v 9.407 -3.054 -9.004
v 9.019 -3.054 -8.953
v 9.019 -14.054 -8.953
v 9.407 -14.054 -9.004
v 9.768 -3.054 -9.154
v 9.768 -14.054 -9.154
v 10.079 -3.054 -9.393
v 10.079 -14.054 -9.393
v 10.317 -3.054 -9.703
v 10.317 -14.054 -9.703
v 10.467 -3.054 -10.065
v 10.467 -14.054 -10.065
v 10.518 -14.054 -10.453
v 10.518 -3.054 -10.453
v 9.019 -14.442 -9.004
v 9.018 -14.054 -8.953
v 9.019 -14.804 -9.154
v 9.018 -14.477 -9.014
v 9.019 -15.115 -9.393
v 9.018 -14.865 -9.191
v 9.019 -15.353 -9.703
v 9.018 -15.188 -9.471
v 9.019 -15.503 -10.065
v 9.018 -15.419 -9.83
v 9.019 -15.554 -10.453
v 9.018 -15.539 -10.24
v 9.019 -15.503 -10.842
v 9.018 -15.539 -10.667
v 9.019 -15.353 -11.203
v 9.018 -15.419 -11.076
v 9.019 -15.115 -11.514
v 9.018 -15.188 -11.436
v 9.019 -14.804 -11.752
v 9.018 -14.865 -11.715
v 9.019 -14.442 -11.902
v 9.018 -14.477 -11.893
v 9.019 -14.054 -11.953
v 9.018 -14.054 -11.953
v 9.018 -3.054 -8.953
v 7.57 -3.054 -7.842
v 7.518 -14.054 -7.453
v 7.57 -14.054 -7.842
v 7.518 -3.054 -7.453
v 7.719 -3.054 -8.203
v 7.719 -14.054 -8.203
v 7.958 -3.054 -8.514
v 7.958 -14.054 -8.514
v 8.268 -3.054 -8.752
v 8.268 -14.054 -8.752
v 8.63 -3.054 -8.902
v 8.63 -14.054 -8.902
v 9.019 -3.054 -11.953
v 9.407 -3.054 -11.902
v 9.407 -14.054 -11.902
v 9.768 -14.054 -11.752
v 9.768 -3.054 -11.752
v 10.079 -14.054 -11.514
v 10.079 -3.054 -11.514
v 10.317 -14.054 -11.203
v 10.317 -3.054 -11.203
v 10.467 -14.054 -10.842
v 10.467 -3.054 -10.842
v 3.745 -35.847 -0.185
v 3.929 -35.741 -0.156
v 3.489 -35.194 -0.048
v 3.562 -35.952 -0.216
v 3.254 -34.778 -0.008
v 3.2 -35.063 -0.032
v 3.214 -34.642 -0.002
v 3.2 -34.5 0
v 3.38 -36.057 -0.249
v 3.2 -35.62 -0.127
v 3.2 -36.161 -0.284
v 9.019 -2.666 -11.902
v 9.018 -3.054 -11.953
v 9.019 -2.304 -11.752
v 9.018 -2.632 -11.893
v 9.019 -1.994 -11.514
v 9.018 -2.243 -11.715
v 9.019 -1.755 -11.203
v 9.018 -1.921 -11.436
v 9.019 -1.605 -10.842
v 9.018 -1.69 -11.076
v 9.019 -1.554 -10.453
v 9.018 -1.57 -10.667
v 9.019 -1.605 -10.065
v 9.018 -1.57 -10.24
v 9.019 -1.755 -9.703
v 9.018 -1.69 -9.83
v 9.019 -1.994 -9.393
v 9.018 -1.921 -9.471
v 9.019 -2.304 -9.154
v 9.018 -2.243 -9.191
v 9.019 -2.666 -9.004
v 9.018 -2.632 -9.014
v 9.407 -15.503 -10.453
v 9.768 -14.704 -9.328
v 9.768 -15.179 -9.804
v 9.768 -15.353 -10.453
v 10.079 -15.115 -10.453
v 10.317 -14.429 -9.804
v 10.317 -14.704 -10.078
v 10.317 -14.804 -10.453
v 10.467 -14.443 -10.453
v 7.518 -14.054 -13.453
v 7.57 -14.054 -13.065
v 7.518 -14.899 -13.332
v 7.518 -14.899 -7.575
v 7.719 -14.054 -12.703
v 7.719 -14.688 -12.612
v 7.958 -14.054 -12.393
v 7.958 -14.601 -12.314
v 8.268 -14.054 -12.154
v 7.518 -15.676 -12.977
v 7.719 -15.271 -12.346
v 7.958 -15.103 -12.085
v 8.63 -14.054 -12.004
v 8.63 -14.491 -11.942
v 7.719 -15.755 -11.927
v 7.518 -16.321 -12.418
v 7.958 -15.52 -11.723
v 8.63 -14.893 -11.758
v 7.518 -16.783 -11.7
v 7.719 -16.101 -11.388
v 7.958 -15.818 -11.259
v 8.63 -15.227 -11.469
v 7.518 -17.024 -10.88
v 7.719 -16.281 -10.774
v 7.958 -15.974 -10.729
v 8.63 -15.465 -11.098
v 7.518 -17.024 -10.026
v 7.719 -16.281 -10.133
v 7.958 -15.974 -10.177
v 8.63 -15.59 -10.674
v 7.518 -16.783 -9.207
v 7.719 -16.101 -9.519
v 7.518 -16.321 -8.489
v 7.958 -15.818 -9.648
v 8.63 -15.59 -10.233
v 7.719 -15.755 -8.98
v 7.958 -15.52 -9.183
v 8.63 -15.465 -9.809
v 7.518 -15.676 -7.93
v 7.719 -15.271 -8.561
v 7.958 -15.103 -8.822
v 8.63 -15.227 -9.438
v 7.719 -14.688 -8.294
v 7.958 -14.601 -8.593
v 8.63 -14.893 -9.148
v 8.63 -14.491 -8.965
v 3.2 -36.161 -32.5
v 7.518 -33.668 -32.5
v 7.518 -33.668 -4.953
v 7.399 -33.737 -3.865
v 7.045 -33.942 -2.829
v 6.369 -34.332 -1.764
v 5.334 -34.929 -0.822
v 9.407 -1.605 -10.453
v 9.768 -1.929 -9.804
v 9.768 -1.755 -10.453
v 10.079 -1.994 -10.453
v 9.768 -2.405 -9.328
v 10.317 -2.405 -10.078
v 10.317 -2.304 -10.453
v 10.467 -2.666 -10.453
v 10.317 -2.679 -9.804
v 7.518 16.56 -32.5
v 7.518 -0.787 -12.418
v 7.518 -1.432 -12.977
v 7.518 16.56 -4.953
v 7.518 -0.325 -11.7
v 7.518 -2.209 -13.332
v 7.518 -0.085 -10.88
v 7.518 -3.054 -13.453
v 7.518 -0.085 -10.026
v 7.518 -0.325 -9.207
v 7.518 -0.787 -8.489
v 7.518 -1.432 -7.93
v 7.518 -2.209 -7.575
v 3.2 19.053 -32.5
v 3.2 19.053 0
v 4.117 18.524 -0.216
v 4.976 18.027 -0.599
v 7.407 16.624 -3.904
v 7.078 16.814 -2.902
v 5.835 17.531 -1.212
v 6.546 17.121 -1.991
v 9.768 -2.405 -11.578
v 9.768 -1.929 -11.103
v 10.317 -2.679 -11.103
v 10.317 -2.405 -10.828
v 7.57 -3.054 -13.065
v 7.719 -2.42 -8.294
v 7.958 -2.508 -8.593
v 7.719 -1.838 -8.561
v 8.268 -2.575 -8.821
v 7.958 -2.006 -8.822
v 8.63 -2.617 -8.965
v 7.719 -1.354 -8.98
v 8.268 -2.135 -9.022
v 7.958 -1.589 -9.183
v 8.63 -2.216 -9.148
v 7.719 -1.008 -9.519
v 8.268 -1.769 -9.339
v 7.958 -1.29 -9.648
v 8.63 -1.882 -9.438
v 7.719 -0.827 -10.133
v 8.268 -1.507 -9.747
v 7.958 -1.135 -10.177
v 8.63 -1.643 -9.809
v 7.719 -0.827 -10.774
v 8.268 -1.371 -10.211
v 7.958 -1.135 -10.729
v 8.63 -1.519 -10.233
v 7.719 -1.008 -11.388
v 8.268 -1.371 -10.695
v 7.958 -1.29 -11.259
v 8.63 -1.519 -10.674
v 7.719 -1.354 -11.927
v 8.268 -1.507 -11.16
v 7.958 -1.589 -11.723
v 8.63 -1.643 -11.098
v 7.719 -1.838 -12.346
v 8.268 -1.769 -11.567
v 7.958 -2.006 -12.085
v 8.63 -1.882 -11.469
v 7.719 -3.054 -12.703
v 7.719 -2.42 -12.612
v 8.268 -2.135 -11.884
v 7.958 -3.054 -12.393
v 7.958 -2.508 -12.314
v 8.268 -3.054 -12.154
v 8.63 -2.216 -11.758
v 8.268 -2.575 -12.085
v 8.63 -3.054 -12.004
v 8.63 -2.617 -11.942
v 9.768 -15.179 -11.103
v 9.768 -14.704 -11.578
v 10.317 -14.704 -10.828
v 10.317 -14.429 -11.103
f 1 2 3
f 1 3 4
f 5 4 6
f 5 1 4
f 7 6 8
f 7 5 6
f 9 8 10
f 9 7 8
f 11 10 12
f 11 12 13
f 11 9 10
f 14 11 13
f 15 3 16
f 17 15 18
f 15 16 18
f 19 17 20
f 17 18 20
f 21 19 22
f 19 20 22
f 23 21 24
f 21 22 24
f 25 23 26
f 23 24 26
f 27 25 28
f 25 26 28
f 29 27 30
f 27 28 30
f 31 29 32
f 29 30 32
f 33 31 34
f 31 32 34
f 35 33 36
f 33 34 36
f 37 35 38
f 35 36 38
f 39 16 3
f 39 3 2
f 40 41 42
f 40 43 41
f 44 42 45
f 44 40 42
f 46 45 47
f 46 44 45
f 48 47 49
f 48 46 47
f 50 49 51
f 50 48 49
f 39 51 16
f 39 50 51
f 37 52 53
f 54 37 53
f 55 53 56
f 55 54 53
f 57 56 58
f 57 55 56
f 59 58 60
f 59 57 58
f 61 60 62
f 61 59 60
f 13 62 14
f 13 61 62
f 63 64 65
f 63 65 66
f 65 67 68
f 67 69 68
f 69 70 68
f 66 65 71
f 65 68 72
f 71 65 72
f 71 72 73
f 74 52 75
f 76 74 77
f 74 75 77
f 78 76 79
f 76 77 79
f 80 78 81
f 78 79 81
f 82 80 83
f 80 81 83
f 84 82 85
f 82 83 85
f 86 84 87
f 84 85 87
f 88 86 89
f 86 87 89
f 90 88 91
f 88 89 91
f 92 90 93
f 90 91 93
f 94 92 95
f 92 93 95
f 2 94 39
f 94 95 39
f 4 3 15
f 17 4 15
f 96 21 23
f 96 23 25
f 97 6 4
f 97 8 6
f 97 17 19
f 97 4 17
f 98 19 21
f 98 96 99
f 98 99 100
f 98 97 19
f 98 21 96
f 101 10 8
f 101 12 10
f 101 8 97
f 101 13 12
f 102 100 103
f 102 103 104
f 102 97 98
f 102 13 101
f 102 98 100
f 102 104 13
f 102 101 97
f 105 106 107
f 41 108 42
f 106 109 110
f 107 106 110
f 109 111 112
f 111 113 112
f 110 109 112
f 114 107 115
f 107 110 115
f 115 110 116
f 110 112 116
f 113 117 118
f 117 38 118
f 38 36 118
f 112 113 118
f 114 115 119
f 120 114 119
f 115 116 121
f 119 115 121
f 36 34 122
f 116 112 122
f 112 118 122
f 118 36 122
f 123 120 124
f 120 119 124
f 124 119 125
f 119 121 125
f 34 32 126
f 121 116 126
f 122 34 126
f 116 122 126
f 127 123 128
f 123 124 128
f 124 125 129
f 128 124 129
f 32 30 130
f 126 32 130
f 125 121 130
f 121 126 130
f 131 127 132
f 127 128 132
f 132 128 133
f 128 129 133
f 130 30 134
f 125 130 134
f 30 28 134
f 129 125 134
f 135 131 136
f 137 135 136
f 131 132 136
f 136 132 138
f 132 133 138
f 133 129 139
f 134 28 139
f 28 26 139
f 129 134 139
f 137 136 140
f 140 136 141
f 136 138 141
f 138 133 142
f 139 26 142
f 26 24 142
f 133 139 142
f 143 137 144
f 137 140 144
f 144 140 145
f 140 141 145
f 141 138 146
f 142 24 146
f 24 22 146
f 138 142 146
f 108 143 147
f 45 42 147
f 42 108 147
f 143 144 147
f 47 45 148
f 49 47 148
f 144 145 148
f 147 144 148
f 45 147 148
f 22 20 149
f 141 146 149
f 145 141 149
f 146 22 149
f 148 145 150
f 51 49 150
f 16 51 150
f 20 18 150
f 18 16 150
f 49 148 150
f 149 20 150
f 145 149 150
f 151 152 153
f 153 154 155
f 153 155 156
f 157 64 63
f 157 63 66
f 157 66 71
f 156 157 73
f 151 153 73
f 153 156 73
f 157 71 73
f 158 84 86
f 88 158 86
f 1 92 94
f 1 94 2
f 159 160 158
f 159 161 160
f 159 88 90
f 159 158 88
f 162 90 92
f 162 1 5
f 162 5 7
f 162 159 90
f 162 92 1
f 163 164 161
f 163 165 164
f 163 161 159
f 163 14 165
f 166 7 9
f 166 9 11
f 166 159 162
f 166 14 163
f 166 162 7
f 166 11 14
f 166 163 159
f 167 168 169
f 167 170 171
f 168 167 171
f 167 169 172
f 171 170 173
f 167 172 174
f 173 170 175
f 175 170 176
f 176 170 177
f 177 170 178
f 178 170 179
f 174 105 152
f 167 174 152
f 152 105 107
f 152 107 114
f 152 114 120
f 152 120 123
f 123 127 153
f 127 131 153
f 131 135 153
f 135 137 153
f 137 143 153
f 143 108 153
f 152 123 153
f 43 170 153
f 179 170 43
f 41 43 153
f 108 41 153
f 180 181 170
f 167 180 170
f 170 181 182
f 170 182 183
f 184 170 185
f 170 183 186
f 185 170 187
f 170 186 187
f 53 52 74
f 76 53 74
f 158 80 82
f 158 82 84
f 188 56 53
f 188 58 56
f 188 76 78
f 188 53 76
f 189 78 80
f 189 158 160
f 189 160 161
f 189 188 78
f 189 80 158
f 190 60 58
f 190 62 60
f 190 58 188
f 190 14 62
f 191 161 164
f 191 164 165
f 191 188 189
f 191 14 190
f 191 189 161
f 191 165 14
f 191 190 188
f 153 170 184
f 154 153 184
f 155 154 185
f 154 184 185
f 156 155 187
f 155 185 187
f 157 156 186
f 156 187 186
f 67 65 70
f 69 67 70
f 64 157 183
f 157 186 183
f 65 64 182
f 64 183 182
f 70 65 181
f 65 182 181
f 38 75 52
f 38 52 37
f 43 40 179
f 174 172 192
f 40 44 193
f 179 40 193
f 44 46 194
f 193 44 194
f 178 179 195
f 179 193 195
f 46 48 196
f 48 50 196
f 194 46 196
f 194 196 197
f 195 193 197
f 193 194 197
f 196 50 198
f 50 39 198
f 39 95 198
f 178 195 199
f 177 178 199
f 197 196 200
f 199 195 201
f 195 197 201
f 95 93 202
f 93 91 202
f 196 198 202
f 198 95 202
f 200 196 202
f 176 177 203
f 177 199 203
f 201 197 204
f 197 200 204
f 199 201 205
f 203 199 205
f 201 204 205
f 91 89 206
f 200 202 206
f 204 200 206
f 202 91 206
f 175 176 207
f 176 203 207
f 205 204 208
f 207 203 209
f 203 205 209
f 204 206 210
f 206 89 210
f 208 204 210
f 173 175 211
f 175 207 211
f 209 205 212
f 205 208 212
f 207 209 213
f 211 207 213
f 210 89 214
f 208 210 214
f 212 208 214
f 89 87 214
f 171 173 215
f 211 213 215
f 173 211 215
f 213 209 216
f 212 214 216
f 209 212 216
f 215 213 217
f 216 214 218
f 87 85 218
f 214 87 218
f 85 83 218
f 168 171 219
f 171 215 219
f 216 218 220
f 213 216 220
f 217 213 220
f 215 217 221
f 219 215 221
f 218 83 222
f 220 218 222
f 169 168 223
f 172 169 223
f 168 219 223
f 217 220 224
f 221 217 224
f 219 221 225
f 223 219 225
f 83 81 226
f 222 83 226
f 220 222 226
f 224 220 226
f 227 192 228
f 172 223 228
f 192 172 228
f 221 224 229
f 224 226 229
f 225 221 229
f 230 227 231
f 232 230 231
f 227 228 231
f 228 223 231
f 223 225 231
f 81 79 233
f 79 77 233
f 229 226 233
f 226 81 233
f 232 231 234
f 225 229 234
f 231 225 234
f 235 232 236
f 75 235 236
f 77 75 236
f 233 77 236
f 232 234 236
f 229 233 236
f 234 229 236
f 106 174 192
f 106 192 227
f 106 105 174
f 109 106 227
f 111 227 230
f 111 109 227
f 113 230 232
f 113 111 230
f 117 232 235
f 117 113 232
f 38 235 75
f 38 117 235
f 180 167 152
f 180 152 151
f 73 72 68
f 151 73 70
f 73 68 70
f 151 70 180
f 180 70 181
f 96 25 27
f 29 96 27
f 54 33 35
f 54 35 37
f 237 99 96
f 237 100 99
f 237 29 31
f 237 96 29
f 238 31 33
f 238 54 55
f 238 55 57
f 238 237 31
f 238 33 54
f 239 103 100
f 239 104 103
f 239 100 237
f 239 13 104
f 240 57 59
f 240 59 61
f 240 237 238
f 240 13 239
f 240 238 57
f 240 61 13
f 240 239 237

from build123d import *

# Parameters (mm, degrees)
BOSS_EXTRUDE1_DEPTH = 32.5
FILLET1_R           = 5
BOSS_EXTRUDE2_DEPTH = 3
FILLET2_R           = 1.5
FILLET3_R           = 1.5
CUT_EXTRUDE1_REACH  = 51.168


# Some blends are built 0.0001 mm under size
with BuildPart() as part:
    # Sketch1 → Boss-Extrude1 (new body)
    with BuildSketch(Plane.XY):
        Polygon((7.518400000000005, 16.559701585568554), (7.518400000000011, -33.66819896343934), (3.199999999999987, -36.16142836590783), (3.1999999999999793, 19.05293098803705), align=None)
    extrude(amount=-BOSS_EXTRUDE1_DEPTH)

    # Fillet1
    # the kernel refuses this fillet: 5 mm, written as the material it takes off along each edge
    with BuildSketch(Plane(origin=(7.518400000000003, 28.94301228989969, 0), x_dir=(0, 0, -1), z_dir=(1.2e-16, -1, 0))) as fillet1_piece_1:
        with BuildLine():
            CenterArc((4.953324281732454, -5), FILLET1_R, 90, 82.16504398350045)
            Line((2.931e-14, -4.318400000000029), (-0.09906648563461919, -4.3047680000000295))
            ThreePointArc((-0.09906648563461919, -4.3047680000000295), (-0.1, -2.1592000000000144), (-0.1, 0))
            Line((-0.1, 0), (0, 0.09999999999999964))
            Line((0, 0.09999999999999964), (4.953324281732454, 0.09999999999999964))
            Line((4.953324281732454, 0.09999999999999964), (4.953324281732454, 0))
        make_face()
    extrude(amount=74.99452195767016, mode=Mode.SUBTRACT)

    # Sketch3 → Boss-Extrude2 (add)
    with BuildSketch(Plane(origin=(7.518400000000007, 9.1e-16, 0), x_dir=(0, 0, -1), z_dir=(1, 1.2e-16, 0))):
        Polygon((8.953324281732419, -1.5542486889353926), (11.953324281732419, -1.554248688935389), (11.95332428173242, -15.55424868893539), (8.95332428173242, -15.55424868893539), align=None)
    extrude(amount=BOSS_EXTRUDE2_DEPTH)

    # Fillet2
    fillet2_edges = [part.edges().sort_by_distance(p)[0] for p in [
        (10.518400000000009, -8.55424868893539, -8.95332428173242),
        (10.518400000000009, -15.554248688935388, -10.45332428173242),
        (10.518400000000009, -8.554248688935386, -11.95332428173242),
        (10.518400000000007, -1.5542486889353895, -10.453324281732419),
    ]]
    fillet(fillet2_edges, radius=FILLET2_R - 0.0001)  # a hair under: the kernel refuses the full size

    # Fillet3
    # the kernel refuses this fillet: 1.5 mm, written as the material it takes off along each edge
    with BuildSketch(Plane(origin=(10.518400000000009, -14.05424868893539, -10.45332428173242), x_dir=(1.2e-16, -1, 0), z_dir=(0, 0, 1))) as fillet3_piece_1:
        with BuildLine():
            CenterArc((9.999999999999e-05, -1.4999), 1.4999, 0, 90)
            Line((1.5, -1.4999), (1.5, 0))
            Line((1.5, 0), (9.999999999999e-05, 0))
        make_face()
    revolve(axis=Axis((10.518400000000009, -14.05424868893539, -10.45332428173242), (1, 1.2e-16, 0)), revolution_arc=90.00000000000001, mode=Mode.SUBTRACT)
    with BuildSketch(Plane(origin=(10.518400000000009, -14.054248688935388, -10.45332428173242), x_dir=(0, -1.3e-16, 1), z_dir=(-1.2e-16, 1, 1.3e-16))) as fillet3_piece_2:
        with BuildLine():
            CenterArc((9.999999999999e-05, -1.4999), 1.4999, 0, 90)
            Line((1.5, -1.4999), (1.5, 0))
            Line((1.5, 0), (9.999999999999e-05, 0))
        make_face()
    revolve(axis=Axis((10.518400000000009, -14.054248688935388, -10.45332428173242), (1, 1.2e-16, 0)), revolution_arc=90, mode=Mode.SUBTRACT)
    with BuildSketch(Plane(origin=(10.518400000000009, -3.05424868893539, -10.453324281732419), x_dir=(0, 1.3e-16, -1), z_dir=(1.2e-16, -1, -1.3e-16))) as fillet3_piece_3:
        with BuildLine():
            CenterArc((9.999999999999e-05, -1.4999), 1.4999, 0, 90)
            Line((1.5, -1.4999), (1.5, 0))
            Line((1.5, 0), (9.999999999999e-05, 0))
        make_face()
    revolve(axis=Axis((10.518400000000009, -3.05424868893539, -10.453324281732419), (1, 1.2e-16, 0)), revolution_arc=90.00000000000006, mode=Mode.SUBTRACT)
    with BuildSketch(Plane(origin=(10.518400000000009, -3.05424868893539, -10.453324281732419), x_dir=(-1.2e-16, 1, 1.18e-15), z_dir=(0, 1.18e-15, -1))) as fillet3_piece_4:
        with BuildLine():
            CenterArc((9.999999999999e-05, -1.4999), 1.4999, 0, 90)
            Line((1.5, -1.4999), (1.5, 0))
            Line((1.5, 0), (9.999999999999e-05, 0))
        make_face()
    revolve(axis=Axis((10.518400000000009, -3.05424868893539, -10.453324281732419), (1, 1.2e-16, 0)), revolution_arc=89.99999999999994, mode=Mode.SUBTRACT)
    with BuildSketch(Plane(origin=(7.518400000000007, -1.5542486889353917, -8.953324281732419), x_dir=(0, 1.18e-15, -1), z_dir=(1, 1.2e-16, 0))) as fillet3_piece_5:
        with BuildLine():
            CenterArc((FILLET3_R, -FILLET3_R), FILLET3_R, 90, 89.99999999999986)
            Line((-1.78e-15, -FILLET3_R), (-FILLET3_R * 0.02, -FILLET3_R))
            Line((-FILLET3_R * 0.02, -FILLET3_R), (-FILLET3_R * 0.02, FILLET3_R * 0.02))
            Line((-FILLET3_R * 0.02, FILLET3_R * 0.02), (FILLET3_R, FILLET3_R * 0.02))
            Line((FILLET3_R, FILLET3_R * 0.02), (FILLET3_R, 0))
        make_face()
    extrude(amount=3, mode=Mode.SUBTRACT)
    with BuildSketch(Plane(origin=(7.518400000000007, -1.5542486889353881, -11.953324281732419), x_dir=(0, -1.18e-15, 1), z_dir=(1, 1.2e-16, 0))) as fillet3_piece_6:
        with BuildLine():
            CenterArc((FILLET3_R, FILLET3_R), FILLET3_R, 179.99999999999994, 90.00000000000006)
            Line((1.78e-15, FILLET3_R), (-FILLET3_R * 0.02, FILLET3_R))
            Line((-FILLET3_R * 0.02, FILLET3_R), (-FILLET3_R * 0.02, -FILLET3_R * 0.02))
            Line((-FILLET3_R * 0.02, -FILLET3_R * 0.02), (FILLET3_R, -FILLET3_R * 0.02))
            Line((FILLET3_R, -FILLET3_R * 0.02), (FILLET3_R, 0))
        make_face()
    extrude(amount=3, mode=Mode.SUBTRACT)
    with BuildSketch(Plane(origin=(7.518400000000009, -15.554248688935388, -11.95332428173242), x_dir=(-1.2e-16, 1, 0), z_dir=(1, 1.2e-16, 0))) as fillet3_piece_7:
        with BuildLine():
            CenterArc((FILLET3_R, FILLET3_R), FILLET3_R, 180, 90)
            Line((-1.78e-15, FILLET3_R), (-FILLET3_R * 0.02, FILLET3_R))
            Line((-FILLET3_R * 0.02, FILLET3_R), (-FILLET3_R * 0.02, -FILLET3_R * 0.02))
            Line((-FILLET3_R * 0.02, -FILLET3_R * 0.02), (FILLET3_R, -FILLET3_R * 0.02))
            Line((FILLET3_R, -FILLET3_R * 0.02), (FILLET3_R, 0))
        make_face()
    extrude(amount=3, mode=Mode.SUBTRACT)
    with BuildSketch(Plane(origin=(7.518400000000009, -15.554248688935388, -8.95332428173242), x_dir=(-1.2e-16, 1, 0), z_dir=(1, 1.2e-16, 0))) as fillet3_piece_8:
        with BuildLine():
            CenterArc((FILLET3_R, -FILLET3_R), FILLET3_R, 90, 90)
            Line((0, -FILLET3_R), (-FILLET3_R * 0.02, -FILLET3_R))
            Line((-FILLET3_R * 0.02, -FILLET3_R), (-FILLET3_R * 0.02, FILLET3_R * 0.02))
            Line((-FILLET3_R * 0.02, FILLET3_R * 0.02), (FILLET3_R, FILLET3_R * 0.02))
            Line((FILLET3_R, FILLET3_R * 0.02), (FILLET3_R, 0))
        make_face()
    extrude(amount=3, mode=Mode.SUBTRACT)
    fillet3_2_edges = [part.edges().sort_by_distance(p)[0] for p in [
        (7.518400000000008, -8.554248688935388, -8.953324281732419),
        (7.518400000000008, -8.55424868893539, -11.95332428173242),
    ]]
    fillet(fillet3_2_edges, radius=FILLET3_R)

    # Sketch4 → Cut-Extrude1 (cut, up to next)
    with BuildSketch(Plane.ZY.offset(-3.199999999999982), mode=Mode.PRIVATE) as cut_extrude1_sk1:
        with BuildLine():
            Line((-0.28410604604419637, -36.161428365907824), (0, -36.16142836590783))
            Line((0, -36.16142836590783), (6.94e-15, -34.499999999999986))
            ThreePointArc((6.94e-15, -34.499999999999986), (-0.07153828412053453, -35.34277227951001), (-0.28410604604419637, -36.161428365907824))
        make_face()
    cut_extrude1_tool1 = extrude(cut_extrude1_sk1.sketch, amount=-CUT_EXTRUDE1_REACH, mode=Mode.PRIVATE) & part.part
    add(cut_extrude1_tool1.solids().sort_by_distance((3.2, -35.748468, -0.0848))[0], mode=Mode.SUBTRACT)


solid = part.part
